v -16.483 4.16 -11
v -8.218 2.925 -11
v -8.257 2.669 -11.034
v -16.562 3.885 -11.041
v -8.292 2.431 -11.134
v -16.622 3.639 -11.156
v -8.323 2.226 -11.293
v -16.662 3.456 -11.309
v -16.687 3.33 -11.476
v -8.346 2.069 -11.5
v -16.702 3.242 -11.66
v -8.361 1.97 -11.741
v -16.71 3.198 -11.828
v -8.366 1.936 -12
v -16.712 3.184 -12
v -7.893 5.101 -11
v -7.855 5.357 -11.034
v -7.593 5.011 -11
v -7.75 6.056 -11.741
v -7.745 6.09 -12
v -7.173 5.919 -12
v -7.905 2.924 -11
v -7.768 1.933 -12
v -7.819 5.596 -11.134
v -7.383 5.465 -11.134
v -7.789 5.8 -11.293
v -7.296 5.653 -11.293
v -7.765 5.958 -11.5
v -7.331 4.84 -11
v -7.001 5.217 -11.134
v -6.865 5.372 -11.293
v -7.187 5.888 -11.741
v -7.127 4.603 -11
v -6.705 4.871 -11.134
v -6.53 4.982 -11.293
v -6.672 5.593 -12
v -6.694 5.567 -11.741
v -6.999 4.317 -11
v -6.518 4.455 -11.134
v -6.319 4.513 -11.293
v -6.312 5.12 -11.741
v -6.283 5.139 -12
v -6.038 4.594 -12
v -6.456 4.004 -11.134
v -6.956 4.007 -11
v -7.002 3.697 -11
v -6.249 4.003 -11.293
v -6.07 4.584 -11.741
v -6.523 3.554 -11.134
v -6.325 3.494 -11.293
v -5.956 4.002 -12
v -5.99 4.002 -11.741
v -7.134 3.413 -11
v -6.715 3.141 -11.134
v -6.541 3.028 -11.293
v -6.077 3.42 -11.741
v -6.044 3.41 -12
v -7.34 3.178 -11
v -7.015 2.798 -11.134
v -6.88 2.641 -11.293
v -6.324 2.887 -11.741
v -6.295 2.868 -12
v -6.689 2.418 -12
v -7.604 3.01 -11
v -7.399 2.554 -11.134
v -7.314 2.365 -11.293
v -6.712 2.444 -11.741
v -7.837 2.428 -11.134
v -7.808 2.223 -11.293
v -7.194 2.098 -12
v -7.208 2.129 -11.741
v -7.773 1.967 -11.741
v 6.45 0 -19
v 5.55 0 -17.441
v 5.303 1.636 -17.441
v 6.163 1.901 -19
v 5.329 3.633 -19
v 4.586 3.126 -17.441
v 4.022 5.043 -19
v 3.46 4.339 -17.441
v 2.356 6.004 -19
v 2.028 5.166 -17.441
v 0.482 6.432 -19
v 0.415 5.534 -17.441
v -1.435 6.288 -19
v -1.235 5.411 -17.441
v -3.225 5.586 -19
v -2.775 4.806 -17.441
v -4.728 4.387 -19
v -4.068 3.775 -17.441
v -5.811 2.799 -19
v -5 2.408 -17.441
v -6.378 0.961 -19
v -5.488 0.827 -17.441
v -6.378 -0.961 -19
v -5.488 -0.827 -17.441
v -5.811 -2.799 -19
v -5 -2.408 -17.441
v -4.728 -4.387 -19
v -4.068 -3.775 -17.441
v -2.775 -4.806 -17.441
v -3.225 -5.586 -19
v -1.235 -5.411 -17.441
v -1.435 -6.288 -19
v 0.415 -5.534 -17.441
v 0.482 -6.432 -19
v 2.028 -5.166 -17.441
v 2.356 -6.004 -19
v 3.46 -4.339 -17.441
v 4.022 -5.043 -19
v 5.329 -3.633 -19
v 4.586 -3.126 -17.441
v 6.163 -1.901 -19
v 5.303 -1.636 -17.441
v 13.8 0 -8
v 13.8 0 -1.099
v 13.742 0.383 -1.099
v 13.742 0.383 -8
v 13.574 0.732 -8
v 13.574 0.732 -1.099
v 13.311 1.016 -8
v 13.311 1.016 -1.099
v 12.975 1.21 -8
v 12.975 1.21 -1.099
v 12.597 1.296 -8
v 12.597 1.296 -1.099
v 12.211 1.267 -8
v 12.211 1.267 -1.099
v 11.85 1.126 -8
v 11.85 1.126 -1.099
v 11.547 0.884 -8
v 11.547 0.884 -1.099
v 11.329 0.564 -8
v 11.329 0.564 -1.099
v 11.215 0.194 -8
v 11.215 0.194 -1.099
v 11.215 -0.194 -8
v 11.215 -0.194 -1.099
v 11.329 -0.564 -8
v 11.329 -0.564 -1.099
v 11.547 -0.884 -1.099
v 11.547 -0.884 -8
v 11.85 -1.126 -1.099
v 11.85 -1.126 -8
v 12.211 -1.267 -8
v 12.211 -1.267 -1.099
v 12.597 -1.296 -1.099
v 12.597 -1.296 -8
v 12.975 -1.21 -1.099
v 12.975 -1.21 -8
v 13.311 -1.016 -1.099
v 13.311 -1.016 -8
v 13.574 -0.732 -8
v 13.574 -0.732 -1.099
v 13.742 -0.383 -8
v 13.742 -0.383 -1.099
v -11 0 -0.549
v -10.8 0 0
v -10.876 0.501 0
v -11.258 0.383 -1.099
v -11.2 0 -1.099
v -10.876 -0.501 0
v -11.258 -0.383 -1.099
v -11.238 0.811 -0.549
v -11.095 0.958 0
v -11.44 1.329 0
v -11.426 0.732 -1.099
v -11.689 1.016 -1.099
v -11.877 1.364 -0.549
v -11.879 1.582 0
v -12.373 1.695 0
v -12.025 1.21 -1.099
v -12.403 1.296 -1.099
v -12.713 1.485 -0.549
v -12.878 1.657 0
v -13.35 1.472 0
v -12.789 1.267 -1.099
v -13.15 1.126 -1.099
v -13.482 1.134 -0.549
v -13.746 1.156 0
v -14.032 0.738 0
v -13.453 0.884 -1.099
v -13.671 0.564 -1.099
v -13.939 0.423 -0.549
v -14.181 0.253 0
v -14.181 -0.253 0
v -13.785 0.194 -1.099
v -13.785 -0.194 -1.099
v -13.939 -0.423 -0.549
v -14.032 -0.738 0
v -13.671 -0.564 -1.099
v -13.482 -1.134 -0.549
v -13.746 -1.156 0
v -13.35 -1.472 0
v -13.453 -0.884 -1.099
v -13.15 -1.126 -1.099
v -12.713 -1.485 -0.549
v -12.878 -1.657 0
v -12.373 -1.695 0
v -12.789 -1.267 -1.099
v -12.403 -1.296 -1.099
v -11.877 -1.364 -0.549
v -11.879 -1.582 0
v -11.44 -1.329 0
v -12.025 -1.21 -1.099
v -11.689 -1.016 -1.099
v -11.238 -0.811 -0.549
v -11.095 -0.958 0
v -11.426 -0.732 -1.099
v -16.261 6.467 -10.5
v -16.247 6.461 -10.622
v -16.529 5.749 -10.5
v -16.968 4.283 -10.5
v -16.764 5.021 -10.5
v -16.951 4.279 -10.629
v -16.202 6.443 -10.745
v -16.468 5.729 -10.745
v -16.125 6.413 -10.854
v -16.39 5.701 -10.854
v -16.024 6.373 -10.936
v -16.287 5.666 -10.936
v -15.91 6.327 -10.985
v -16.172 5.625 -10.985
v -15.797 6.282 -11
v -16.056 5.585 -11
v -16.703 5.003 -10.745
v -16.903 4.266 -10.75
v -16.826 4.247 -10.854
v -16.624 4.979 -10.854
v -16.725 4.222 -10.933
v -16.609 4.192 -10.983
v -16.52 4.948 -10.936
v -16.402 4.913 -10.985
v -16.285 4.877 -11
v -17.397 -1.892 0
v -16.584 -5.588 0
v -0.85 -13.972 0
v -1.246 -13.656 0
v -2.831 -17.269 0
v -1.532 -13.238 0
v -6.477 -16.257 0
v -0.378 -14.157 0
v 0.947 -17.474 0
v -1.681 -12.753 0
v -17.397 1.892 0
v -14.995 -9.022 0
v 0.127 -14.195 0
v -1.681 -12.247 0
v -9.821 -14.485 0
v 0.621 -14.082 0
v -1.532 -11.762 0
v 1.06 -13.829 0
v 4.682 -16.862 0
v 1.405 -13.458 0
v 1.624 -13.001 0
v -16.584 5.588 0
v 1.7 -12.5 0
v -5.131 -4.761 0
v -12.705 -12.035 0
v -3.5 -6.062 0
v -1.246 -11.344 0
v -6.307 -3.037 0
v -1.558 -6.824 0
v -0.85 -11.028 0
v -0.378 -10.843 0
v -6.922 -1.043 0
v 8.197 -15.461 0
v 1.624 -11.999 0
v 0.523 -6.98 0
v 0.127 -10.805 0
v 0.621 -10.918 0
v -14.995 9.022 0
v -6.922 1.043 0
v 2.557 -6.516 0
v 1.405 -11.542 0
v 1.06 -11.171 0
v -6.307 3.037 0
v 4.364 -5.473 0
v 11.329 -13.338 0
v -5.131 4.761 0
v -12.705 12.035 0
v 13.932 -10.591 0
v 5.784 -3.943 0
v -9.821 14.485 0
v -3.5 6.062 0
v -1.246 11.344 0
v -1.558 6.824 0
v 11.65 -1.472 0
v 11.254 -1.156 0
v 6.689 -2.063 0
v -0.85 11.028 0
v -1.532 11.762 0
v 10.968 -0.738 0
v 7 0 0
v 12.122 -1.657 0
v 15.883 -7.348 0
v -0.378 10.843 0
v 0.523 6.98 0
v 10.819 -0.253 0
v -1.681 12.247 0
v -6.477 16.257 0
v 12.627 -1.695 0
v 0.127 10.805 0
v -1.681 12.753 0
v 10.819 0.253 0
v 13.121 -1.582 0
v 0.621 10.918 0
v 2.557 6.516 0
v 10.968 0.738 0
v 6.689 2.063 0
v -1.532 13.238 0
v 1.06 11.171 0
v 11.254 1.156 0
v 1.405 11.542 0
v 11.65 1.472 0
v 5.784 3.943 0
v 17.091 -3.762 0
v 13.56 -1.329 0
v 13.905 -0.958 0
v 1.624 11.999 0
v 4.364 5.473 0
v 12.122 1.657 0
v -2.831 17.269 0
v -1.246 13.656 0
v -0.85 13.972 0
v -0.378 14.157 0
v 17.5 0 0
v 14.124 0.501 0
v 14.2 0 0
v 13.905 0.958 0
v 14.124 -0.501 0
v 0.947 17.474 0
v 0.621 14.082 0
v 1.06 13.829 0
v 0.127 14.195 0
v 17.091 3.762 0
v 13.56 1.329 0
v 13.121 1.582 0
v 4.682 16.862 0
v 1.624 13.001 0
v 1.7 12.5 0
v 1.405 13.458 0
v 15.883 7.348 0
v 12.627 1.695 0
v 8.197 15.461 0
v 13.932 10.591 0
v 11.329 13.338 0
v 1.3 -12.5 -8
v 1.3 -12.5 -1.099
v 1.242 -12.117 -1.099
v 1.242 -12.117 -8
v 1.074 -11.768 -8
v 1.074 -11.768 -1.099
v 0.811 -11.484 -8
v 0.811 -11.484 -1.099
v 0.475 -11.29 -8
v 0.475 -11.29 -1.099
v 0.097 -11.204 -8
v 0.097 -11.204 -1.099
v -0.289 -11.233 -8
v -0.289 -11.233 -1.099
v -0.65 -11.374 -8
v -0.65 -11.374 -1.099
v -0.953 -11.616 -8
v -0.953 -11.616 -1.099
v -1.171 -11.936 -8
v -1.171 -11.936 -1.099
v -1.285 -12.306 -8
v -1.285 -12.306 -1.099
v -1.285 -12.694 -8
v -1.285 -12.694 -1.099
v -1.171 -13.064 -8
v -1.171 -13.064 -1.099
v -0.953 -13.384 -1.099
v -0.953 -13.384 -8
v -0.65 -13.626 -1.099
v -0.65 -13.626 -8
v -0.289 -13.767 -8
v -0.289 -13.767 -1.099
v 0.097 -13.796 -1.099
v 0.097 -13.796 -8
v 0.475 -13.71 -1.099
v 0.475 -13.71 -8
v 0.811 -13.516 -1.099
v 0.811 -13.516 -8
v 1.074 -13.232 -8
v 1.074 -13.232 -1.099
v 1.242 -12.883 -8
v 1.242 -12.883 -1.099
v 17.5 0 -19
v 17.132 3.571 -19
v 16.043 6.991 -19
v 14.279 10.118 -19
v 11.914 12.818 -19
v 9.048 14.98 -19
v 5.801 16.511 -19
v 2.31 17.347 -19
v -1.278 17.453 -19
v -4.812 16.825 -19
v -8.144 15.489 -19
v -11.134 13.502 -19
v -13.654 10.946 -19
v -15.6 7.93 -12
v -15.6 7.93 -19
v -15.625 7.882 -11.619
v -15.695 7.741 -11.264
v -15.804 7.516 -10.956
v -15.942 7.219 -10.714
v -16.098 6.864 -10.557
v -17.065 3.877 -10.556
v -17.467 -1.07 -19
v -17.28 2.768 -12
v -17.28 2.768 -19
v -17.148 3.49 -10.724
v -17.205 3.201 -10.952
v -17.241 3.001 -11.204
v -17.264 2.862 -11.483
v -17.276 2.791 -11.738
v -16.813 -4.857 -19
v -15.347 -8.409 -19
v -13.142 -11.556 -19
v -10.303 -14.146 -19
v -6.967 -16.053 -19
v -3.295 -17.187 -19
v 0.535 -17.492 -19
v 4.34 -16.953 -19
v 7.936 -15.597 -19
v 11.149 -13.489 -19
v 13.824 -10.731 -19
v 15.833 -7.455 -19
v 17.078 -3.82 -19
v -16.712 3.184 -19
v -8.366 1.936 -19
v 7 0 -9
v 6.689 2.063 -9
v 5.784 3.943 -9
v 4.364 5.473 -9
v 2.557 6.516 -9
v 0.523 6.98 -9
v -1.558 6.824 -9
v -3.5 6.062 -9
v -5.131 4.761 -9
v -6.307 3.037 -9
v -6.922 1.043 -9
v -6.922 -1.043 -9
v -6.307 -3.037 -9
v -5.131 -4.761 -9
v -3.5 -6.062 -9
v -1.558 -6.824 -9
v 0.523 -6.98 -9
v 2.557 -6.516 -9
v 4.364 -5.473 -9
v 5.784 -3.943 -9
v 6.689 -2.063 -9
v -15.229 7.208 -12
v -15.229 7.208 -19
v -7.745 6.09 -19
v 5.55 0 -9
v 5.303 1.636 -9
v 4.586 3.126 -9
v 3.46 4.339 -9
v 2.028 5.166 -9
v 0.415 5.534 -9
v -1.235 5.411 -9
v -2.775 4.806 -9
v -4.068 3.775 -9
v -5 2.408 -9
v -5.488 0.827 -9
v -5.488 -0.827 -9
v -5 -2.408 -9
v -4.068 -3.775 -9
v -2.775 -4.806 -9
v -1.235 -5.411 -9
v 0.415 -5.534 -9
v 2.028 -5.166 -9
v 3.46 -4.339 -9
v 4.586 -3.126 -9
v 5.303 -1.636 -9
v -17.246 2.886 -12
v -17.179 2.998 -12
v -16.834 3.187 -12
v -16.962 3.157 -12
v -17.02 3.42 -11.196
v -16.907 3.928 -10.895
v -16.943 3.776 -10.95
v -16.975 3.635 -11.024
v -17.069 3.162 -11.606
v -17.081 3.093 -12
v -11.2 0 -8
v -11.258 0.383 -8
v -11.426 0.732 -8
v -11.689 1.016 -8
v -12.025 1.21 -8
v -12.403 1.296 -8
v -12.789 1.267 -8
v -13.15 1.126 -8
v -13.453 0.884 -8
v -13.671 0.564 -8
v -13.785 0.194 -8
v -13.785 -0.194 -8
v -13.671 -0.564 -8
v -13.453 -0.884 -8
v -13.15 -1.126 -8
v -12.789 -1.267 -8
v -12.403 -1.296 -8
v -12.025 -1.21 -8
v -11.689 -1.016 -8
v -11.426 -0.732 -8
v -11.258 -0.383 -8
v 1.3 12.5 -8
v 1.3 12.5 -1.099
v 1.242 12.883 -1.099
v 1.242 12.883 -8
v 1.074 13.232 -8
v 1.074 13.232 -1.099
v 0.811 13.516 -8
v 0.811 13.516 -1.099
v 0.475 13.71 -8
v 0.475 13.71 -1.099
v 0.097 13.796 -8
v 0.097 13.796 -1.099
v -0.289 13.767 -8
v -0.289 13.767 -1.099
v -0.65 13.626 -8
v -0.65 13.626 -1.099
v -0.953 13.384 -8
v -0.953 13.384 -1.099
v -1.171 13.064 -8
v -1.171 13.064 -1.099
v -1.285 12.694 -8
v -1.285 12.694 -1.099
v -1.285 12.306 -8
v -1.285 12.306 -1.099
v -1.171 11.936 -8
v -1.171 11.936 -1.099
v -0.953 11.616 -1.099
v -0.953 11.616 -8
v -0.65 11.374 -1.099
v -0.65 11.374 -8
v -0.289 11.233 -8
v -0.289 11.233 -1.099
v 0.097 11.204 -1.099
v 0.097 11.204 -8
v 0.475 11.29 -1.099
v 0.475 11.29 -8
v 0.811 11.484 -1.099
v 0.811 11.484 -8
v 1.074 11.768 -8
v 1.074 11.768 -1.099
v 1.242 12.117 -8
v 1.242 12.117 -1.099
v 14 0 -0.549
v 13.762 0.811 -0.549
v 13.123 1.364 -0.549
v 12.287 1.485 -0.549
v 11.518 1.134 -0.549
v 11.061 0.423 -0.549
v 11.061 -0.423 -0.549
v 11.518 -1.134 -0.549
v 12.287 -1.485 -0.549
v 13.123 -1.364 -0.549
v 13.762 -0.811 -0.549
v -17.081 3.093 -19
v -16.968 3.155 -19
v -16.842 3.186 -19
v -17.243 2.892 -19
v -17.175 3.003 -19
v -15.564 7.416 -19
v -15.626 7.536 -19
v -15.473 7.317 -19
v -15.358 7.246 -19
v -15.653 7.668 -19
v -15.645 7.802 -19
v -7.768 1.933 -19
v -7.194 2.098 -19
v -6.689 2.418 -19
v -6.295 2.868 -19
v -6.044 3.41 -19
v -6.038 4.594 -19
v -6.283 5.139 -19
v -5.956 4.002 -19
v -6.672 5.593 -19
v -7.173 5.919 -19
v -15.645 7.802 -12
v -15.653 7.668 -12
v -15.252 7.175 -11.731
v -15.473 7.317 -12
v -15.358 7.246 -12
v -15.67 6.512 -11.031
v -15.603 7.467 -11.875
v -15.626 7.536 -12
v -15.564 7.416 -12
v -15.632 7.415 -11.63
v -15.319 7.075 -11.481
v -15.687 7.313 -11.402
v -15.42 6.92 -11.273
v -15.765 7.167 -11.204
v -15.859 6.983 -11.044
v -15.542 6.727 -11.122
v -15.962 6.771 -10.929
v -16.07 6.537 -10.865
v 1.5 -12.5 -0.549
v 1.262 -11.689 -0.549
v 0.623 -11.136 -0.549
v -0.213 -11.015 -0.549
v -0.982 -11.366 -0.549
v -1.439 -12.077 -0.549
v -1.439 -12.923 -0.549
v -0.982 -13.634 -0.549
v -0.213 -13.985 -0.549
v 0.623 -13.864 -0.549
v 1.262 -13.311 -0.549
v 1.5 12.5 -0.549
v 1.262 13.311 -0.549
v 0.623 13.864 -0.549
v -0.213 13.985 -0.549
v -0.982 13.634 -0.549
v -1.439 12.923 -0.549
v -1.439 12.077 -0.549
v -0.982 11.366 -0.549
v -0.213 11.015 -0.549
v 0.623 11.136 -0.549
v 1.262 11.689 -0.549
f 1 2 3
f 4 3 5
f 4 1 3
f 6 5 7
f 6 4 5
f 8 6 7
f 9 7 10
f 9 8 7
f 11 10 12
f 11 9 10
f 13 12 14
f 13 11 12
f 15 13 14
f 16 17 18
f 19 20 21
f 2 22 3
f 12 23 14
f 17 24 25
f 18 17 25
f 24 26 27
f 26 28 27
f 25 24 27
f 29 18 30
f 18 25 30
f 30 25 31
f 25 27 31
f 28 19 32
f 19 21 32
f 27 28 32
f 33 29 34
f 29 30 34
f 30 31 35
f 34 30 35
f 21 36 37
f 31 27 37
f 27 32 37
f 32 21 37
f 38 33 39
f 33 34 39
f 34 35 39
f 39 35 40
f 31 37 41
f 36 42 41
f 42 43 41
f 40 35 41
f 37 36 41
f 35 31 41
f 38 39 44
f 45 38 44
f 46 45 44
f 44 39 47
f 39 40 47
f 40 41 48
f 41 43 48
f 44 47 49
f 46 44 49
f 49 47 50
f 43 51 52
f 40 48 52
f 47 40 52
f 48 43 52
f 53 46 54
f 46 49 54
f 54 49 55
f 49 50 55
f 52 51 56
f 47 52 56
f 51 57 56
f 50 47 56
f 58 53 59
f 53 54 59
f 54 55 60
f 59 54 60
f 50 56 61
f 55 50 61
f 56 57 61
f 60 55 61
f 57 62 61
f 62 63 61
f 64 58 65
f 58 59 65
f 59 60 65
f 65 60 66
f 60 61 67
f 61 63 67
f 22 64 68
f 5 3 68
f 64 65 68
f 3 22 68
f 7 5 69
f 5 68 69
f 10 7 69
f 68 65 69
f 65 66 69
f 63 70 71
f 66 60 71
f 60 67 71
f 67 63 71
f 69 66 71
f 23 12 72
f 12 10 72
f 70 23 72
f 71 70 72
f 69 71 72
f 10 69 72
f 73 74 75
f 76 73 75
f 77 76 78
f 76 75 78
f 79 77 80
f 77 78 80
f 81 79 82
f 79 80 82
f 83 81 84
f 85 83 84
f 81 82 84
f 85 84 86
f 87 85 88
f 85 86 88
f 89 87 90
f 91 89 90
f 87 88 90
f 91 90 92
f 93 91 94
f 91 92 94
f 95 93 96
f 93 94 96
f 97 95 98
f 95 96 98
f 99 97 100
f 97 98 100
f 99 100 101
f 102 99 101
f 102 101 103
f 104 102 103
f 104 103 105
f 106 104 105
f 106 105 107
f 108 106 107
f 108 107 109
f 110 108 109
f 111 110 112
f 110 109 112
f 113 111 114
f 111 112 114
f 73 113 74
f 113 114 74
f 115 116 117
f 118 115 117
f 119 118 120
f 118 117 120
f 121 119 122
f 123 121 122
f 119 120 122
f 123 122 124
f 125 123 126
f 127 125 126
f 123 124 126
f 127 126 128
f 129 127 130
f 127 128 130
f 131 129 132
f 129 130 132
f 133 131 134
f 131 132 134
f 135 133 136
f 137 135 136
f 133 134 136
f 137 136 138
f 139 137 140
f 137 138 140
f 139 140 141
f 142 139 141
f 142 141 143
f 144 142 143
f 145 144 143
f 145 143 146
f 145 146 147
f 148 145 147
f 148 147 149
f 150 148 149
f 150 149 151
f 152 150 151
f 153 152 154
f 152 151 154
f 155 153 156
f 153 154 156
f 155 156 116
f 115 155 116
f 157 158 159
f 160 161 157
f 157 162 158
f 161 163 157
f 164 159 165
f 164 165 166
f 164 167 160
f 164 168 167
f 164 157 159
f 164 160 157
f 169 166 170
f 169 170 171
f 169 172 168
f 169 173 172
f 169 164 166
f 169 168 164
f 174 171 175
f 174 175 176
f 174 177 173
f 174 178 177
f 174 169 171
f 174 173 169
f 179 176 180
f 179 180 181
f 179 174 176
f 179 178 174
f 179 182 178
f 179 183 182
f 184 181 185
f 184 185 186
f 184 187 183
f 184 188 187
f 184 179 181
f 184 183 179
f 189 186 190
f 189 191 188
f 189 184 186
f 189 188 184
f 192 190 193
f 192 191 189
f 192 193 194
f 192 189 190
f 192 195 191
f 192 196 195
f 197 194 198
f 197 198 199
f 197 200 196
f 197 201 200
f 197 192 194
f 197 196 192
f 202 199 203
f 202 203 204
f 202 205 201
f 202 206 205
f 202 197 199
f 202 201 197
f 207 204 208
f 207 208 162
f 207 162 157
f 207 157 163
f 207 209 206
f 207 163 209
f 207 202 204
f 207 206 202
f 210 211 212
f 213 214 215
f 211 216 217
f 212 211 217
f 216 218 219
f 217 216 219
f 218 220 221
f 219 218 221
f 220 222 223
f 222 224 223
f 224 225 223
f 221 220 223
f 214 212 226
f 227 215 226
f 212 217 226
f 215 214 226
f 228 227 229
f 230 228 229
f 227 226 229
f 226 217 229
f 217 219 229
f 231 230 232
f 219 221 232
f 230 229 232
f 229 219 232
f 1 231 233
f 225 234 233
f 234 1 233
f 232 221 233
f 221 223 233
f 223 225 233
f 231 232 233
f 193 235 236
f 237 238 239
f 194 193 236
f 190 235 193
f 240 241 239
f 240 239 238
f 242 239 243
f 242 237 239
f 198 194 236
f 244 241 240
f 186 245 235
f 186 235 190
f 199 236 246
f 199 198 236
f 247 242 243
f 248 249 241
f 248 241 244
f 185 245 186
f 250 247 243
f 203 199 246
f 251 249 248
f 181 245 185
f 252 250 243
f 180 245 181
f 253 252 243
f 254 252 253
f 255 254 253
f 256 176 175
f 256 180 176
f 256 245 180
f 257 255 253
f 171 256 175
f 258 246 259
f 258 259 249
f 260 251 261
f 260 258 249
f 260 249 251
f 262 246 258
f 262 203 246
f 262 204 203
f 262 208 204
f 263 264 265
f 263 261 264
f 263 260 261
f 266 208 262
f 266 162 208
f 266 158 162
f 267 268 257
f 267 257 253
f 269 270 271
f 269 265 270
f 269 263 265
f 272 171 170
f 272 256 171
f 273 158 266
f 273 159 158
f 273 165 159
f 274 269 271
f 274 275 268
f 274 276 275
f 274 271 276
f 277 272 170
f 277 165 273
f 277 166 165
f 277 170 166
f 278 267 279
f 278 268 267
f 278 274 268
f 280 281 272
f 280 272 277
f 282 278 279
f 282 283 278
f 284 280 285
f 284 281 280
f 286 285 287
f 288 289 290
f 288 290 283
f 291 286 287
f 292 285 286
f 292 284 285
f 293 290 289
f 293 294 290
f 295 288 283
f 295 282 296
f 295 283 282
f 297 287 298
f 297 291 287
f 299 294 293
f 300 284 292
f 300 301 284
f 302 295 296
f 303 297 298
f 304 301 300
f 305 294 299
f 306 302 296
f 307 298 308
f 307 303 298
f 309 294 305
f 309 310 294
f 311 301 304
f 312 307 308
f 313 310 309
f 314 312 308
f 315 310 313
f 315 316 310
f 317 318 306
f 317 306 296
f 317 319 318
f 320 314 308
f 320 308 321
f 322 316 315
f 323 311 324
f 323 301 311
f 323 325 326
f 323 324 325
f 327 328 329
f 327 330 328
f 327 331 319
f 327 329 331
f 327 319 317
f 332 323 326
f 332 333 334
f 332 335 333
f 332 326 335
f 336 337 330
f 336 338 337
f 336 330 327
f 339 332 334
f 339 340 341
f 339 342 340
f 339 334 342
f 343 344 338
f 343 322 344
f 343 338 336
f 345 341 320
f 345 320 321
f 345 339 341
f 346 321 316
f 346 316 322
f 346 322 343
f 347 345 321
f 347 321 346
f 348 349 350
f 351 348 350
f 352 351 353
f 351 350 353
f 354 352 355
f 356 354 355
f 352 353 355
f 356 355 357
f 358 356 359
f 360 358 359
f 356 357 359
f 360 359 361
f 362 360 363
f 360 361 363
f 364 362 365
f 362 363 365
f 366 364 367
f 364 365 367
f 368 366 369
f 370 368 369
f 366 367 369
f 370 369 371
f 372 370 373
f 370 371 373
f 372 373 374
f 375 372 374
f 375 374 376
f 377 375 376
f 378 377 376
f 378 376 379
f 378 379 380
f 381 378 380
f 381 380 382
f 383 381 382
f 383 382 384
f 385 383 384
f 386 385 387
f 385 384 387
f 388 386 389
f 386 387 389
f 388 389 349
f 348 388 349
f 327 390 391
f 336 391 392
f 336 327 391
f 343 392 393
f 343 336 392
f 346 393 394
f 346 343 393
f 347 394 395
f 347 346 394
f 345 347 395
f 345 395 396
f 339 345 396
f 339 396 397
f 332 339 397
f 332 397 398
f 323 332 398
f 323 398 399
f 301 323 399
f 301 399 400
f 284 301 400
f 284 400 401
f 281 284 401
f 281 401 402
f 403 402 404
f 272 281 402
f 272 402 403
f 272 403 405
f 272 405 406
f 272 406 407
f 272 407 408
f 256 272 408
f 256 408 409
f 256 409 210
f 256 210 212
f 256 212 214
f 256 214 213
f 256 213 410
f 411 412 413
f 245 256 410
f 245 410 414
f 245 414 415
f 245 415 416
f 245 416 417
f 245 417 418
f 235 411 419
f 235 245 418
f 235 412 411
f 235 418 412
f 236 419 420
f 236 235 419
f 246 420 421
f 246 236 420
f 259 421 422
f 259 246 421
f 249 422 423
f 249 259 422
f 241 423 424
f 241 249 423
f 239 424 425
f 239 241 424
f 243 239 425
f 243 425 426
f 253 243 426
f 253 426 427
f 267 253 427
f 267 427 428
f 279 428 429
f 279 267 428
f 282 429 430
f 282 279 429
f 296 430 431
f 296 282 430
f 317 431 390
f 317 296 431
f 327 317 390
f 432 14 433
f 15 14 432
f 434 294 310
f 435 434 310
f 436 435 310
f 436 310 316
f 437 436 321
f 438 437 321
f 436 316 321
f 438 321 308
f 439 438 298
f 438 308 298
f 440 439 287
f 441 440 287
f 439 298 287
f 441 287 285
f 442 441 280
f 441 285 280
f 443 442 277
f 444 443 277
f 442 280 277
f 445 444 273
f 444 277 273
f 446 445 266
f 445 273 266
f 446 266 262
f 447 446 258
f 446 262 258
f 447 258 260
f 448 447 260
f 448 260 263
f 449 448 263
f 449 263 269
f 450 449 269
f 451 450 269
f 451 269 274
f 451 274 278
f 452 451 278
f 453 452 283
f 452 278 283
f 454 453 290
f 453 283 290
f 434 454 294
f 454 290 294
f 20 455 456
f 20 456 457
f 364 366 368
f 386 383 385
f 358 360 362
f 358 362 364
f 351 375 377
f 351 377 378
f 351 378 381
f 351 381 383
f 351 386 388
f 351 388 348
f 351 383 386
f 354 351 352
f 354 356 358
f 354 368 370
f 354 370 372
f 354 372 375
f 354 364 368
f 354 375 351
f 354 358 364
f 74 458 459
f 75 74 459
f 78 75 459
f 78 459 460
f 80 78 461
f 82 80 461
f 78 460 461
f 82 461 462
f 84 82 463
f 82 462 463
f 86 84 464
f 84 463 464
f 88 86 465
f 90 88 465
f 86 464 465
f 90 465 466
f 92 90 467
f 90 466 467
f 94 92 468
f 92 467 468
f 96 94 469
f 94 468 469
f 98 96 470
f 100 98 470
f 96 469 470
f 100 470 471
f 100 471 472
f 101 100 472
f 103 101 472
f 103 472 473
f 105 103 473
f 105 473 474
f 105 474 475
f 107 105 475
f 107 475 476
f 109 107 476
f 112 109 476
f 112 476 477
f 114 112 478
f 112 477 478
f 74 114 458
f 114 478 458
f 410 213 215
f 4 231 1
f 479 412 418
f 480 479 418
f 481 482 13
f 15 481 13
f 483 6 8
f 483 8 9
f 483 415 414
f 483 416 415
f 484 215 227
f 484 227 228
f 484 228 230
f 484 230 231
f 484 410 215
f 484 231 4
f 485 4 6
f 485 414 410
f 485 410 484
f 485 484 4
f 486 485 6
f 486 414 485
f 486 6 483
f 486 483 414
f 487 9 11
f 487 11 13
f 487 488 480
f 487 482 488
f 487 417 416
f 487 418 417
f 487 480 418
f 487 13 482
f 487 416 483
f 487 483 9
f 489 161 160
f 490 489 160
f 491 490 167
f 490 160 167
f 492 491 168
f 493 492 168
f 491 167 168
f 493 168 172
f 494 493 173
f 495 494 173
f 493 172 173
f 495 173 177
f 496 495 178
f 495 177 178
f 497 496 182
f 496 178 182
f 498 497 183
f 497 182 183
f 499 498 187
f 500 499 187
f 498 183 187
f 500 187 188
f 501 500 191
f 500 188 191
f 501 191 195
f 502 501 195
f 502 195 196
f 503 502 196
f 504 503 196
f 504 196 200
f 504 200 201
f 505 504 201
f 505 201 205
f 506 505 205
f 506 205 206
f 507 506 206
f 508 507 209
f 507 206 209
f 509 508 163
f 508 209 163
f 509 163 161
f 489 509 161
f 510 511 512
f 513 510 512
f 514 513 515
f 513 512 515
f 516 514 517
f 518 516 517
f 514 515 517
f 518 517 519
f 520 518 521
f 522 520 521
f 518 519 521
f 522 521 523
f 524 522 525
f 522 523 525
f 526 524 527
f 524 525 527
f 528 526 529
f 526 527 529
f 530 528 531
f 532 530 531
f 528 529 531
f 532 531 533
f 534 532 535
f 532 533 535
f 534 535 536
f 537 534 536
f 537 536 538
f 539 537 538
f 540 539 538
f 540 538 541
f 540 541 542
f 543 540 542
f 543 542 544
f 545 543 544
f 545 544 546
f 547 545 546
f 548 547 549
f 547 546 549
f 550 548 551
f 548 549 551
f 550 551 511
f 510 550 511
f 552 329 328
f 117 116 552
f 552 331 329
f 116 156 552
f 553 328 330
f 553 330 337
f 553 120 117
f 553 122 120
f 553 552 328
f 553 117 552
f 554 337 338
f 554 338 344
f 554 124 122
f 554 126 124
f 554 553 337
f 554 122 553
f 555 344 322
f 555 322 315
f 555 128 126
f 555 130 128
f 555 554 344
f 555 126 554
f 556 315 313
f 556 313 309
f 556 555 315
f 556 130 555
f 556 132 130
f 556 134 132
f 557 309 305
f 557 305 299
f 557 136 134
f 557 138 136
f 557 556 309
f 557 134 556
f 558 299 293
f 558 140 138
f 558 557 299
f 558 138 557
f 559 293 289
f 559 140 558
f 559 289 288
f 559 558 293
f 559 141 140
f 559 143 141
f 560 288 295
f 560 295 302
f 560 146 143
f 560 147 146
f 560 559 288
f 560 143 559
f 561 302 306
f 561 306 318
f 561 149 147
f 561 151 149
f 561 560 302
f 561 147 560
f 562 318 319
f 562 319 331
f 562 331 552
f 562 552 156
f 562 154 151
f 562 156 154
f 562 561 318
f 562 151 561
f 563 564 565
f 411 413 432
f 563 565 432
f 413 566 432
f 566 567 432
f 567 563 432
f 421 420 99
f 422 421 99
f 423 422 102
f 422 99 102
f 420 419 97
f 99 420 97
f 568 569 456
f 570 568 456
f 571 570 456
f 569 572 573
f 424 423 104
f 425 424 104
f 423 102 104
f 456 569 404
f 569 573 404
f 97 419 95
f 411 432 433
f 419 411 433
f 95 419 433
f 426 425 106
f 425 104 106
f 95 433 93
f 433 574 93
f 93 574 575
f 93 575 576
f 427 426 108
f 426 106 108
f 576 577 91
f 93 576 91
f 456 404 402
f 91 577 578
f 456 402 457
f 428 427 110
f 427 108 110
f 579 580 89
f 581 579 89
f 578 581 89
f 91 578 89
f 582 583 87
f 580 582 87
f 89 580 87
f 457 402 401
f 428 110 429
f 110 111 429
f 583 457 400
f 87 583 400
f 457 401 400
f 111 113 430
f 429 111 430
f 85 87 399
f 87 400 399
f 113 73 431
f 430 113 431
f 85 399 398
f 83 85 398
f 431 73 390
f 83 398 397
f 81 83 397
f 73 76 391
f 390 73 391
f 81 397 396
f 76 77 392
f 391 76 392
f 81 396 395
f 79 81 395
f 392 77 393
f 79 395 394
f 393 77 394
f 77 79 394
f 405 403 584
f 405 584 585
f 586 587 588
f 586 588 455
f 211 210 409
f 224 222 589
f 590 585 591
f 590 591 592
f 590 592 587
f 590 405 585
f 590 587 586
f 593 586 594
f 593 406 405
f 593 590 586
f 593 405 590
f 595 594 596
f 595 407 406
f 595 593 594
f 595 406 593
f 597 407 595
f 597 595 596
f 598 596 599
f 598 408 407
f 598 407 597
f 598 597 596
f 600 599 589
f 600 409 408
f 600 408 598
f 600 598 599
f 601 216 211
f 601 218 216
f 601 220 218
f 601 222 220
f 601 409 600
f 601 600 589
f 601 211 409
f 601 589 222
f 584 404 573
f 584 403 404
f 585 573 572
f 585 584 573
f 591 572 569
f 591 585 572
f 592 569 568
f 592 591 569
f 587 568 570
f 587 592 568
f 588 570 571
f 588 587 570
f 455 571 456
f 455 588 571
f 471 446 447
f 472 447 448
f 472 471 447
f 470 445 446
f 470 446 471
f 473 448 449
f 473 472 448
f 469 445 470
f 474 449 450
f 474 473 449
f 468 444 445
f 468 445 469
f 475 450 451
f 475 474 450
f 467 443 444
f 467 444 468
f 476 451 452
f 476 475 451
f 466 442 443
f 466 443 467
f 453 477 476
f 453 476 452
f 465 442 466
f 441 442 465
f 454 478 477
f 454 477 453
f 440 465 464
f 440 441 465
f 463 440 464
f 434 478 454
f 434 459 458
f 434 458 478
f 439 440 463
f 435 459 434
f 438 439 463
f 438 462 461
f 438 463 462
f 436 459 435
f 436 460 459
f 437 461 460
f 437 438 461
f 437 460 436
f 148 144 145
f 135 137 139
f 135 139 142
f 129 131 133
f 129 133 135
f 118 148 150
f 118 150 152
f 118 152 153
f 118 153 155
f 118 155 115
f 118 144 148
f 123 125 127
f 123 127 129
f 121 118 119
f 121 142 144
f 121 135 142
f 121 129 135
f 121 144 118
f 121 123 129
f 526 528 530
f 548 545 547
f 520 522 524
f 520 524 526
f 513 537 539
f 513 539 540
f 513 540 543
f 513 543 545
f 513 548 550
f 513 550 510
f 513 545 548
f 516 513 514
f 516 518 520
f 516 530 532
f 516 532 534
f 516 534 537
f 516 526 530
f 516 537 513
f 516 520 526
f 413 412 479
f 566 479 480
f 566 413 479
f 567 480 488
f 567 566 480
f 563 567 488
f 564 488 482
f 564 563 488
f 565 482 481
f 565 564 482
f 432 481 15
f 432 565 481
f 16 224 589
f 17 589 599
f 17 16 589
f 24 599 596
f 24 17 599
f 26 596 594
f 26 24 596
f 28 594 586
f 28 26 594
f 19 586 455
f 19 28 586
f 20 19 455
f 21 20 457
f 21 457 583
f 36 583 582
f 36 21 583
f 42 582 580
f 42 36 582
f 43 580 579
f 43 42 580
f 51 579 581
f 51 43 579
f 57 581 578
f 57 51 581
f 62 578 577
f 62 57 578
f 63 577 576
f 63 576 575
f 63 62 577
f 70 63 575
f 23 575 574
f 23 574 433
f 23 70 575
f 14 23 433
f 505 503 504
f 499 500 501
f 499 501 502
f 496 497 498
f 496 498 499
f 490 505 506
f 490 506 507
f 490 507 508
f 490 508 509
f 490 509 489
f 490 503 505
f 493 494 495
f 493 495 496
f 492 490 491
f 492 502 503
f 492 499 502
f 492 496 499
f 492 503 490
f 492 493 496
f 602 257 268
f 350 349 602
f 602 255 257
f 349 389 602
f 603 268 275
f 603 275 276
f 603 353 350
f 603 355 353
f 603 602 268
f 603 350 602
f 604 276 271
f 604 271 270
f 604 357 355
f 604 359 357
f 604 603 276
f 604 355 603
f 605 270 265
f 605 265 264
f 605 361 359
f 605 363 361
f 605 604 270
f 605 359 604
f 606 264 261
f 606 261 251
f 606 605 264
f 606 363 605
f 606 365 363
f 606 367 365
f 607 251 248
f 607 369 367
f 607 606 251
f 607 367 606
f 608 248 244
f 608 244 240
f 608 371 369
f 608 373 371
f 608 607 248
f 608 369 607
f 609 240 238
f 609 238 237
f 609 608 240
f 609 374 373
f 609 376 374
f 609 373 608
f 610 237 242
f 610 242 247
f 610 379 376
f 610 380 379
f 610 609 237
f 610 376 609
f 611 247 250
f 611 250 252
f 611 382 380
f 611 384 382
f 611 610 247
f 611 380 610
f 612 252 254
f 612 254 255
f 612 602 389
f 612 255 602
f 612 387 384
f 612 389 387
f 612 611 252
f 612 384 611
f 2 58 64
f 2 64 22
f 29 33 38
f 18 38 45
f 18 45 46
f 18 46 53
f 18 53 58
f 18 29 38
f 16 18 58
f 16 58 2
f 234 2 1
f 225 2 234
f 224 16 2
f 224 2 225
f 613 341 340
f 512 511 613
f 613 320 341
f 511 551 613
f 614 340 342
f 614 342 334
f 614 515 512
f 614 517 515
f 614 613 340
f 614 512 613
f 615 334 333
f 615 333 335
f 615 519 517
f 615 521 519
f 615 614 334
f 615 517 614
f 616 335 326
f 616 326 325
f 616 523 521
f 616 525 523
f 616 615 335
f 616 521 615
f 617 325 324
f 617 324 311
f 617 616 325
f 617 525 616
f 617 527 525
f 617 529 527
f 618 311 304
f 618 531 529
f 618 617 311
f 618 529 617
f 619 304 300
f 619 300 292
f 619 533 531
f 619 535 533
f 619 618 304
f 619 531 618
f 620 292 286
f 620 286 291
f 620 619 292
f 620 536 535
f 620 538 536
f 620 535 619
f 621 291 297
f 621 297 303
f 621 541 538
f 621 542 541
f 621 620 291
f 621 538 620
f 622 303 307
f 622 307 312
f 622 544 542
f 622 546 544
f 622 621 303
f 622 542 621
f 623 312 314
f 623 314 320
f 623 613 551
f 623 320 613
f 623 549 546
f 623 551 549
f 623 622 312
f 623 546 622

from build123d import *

# Parameters (mm, degrees)
SKETCH_1_R          = 17.5
EXTRUDE_1_DEPTH     = 19
SKETCH_2_R          = 1.3
CUT_EXTRUDE_1_DEPTH = 8
SKETCH_4_R          = 7
CUT_EXTRUDE_3_DEPTH = 9
SKETCH_5_R          = 5.55
CUT_EXTRUDE_4_DEPTH = 10
CUT_EXTRUDE_START   = -8
CUT_EXTRUDE_6_DEPTH = 8
FILLET_1_R          = 1
FILLET_2_R          = 0.5
CHAMFER_1_SIZE      = 0.9
CHAMFER_1_SIZE2     = 1.558845727
CHAMFER_2_SIZE      = 0.4
CHAMFER_2_SIZE2     = 1.098990968


with BuildPart() as part:
    # 草图1 → 凸台-拉伸1 (new body)
    with BuildSketch(Plane.XY):
        Circle(SKETCH_1_R)
    extrude(amount=-EXTRUDE_1_DEPTH)

    # 草图2 → 切除-拉伸1 (cut)
    with BuildSketch(Plane.XY):
        with Locations((12.5, 0)):
            Circle(SKETCH_2_R)
        with Locations((0, -12.5)):
            Circle(SKETCH_2_R)
        with Locations((-12.5, 0)):
            Circle(SKETCH_2_R)
        with Locations((0, 12.5)):
            Circle(SKETCH_2_R)
    extrude(amount=-CUT_EXTRUDE_1_DEPTH, mode=Mode.SUBTRACT)

    # 草图4 → 切除-拉伸3 (cut)
    with BuildSketch(Plane.XY):
        Circle(SKETCH_4_R)
    extrude(amount=-CUT_EXTRUDE_3_DEPTH, mode=Mode.SUBTRACT)

    # 草图5 → 切除-拉伸4 (cut)
    with BuildSketch(Plane.XY.offset(-9)):
        Circle(SKETCH_5_R)
    extrude(amount=-CUT_EXTRUDE_4_DEPTH, mode=Mode.SUBTRACT)

    # 草图11 → 切除-拉伸6 (cut)
    with BuildSketch(Plane(origin=(0, 0, -19), x_dir=(-1, 0, 0), z_dir=(0, 0, -1)).offset(CUT_EXTRUDE_START)):
        with BuildLine():
            ThreePointArc((17.194499347, 3.255640061), (16.671203225, 5.32174624), (15.900621658, 7.308914482))
            Line((15.900621658, 7.308914482), (7.74531425, 6.090095623))
            ThreePointArc((7.74531425, 6.090095623), (5.978780701, 3.702762547), (8.366113777, 1.936228997))
            Line((8.366113777, 1.936228997), (17.194499347, 3.255640061))
        make_face()
    extrude(amount=CUT_EXTRUDE_6_DEPTH, mode=Mode.SUBTRACT)

    # 圆角1
    fillet_1_edges = [part.edges().sort_by_distance(p)[0] for p in [
        (-11.822967954, 6.699505053, -11),
        (-5.978780701, 3.702762547, -11),
        (-12.780306562, 2.595934529, -11),
    ]]
    fillet(fillet_1_edges, radius=FILLET_1_R)

    # 圆角2
    fillet_2_edges = [part.edges().sort_by_distance(p)[0] for p in [
        (-17.194499347, 3.255640061, -15.5),
        (-16.675851852, 5.30716167, -11),
        (-15.900621658, 7.308914482, -15.5),
        (-17.137411019, 3.543888201, -11.292266818),
        (-16.027314009, 7.026749296, -11.28802798),
    ]]
    fillet(fillet_2_edges, radius=FILLET_2_R)

    # 倒角1
    chamfer_1_edges = [part.edges().sort_by_distance(p)[0] for p in [
        (-5.55, 0, -19),
    ]]
    chamfer_1_side = [part.faces().sort_by_distance(p)[0] for p in [
        (-1.349167098, -16.951419764, -19),
    ]]
    chamfer(chamfer_1_edges, length=CHAMFER_1_SIZE, length2=CHAMFER_1_SIZE2, reference=chamfer_1_side[0])

    # 倒角2
    chamfer_2_edges = [part.edges().sort_by_distance(p)[0] for p in [
        (-1.3, -12.5, 0),
        (-13.8, 0, 0),
        (-1.3, 12.5, 0),
        (11.2, 0, 0),
    ]]
    chamfer_2_side = [part.faces().sort_by_distance(p)[0] for p in [
        (-17.005025253, 0, 0),
    ]]
    chamfer(chamfer_2_edges, length=CHAMFER_2_SIZE, length2=CHAMFER_2_SIZE2, reference=chamfer_2_side[0])


solid = part.part
